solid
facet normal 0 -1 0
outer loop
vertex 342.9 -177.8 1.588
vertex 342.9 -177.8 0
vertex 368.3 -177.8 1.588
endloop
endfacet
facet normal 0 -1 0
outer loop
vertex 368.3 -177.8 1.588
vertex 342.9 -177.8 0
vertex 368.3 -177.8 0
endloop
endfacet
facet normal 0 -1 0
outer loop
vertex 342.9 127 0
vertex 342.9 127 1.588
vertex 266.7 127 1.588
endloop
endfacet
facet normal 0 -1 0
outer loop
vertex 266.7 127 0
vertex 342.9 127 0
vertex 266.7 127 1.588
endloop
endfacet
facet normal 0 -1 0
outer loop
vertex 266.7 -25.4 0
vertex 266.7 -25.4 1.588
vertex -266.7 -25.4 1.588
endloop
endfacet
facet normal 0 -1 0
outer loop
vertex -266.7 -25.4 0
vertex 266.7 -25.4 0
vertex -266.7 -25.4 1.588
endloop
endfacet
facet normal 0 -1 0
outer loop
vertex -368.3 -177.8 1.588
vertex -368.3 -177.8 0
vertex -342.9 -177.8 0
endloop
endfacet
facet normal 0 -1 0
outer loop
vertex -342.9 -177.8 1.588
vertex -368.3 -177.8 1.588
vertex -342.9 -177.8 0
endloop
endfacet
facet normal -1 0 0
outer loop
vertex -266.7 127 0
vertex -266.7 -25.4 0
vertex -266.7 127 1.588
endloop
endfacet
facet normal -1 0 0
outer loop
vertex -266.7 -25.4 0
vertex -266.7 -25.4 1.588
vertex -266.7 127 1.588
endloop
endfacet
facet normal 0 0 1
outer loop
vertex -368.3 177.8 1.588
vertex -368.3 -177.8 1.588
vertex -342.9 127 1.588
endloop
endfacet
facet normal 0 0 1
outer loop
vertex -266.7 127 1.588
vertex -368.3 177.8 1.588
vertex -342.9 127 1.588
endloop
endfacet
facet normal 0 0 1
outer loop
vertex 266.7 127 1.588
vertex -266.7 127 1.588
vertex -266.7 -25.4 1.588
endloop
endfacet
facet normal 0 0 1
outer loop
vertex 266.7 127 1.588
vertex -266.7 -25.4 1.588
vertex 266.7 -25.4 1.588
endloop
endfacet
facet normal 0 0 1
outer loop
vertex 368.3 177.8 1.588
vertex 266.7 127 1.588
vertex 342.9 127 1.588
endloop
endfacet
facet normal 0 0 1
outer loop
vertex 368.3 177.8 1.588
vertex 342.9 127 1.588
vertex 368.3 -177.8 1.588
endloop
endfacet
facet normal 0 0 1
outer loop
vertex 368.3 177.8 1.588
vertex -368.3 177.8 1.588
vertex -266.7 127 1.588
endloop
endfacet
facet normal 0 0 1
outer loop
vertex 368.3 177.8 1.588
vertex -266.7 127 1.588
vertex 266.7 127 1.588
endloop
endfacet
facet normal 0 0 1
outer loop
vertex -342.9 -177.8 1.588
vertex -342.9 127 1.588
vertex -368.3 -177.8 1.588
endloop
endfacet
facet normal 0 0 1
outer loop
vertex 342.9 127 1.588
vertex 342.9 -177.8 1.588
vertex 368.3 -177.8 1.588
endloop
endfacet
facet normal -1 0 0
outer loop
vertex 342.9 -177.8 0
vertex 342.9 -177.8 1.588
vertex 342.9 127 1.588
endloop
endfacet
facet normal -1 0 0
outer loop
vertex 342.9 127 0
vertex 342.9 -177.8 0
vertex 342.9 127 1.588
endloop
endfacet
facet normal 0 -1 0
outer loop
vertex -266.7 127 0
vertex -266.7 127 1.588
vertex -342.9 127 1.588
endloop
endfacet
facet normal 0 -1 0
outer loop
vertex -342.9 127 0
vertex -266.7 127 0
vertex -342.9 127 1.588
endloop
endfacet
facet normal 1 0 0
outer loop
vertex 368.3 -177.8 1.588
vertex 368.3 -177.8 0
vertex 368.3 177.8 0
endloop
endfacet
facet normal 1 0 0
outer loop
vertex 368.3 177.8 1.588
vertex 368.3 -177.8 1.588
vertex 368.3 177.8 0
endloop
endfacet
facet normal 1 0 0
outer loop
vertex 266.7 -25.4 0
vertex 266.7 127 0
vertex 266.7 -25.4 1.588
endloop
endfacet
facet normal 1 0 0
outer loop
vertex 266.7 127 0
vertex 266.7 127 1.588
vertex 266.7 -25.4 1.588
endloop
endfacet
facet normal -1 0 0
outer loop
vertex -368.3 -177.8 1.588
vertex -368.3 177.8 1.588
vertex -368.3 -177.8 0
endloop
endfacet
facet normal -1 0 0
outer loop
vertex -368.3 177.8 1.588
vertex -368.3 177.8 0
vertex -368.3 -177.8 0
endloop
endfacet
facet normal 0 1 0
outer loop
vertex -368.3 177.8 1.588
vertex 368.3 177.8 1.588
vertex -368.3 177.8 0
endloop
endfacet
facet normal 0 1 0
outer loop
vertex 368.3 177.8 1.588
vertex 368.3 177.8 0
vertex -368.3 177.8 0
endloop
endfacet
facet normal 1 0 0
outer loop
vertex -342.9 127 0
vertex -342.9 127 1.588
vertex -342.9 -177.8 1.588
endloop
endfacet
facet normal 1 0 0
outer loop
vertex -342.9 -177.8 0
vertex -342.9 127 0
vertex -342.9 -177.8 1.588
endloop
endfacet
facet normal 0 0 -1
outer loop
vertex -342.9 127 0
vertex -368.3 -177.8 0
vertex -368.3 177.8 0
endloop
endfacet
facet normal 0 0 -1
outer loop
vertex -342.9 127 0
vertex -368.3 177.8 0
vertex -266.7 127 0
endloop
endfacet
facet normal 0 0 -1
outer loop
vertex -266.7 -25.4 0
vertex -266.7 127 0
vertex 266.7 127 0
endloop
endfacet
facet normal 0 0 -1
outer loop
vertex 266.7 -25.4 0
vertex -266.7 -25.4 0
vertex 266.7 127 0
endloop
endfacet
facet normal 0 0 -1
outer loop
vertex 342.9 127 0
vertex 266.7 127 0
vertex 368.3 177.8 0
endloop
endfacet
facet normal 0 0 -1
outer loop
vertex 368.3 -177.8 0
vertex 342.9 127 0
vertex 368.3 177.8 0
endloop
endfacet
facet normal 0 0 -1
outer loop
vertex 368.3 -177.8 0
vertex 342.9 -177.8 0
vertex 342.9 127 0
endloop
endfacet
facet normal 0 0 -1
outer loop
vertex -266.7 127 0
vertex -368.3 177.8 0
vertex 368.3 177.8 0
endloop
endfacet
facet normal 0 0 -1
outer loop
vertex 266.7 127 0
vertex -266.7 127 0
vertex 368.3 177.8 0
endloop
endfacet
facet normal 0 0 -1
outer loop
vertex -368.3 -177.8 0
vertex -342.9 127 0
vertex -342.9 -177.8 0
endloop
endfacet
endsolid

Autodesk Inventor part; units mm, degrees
ref_plane "YZ Plane" through (0, 0, 0) normal (1, 0, 0) x (0, 1, 0)
ref_plane "XZ Plane" through (0, 0, 0) normal (0, 1, 0) x (-1, 0, 0)
ref_plane "XY Plane" through (0, 0, 0) normal (0, 0, 1) x (1, 0, 0)
sketch "Sketch1" plane through (0, 0, 0) normal (0, 0, 1) x (1, 0, 0)
  line L0 (-368.3, -177.8) -> (368.3, -177.8)
  line L1 (368.3, -177.8) -> (368.3, 177.8)
  line L2 (368.3, 177.8) -> (-368.3, 177.8)
  line L3 (-368.3, 177.8) -> (-368.3, -177.8)
  line L4 (-368.3, -177.8) -> (368.3, 177.8) construction
  line L5 (368.3, -177.8) -> (-368.3, 177.8) construction
  point P0 (0, 0)
  dimension "d0" = 355.6
  dimension "d1" = 736.6
extrude "Extrusion1" add sketch "Sketch1" along normal blind 1.5875
sketch "Sketch2" plane through (0, 0, 1.5875) normal (0, 0, 1) x (1, 0, 0)
  line L0 (-368.3, -177.8) -> (368.3, -177.8) projected
  line L1 (368.3, -177.8) -> (368.3, 177.8) projected
  line L2 (368.3, 177.8) -> (-368.3, 177.8) projected
  line L3 (-368.3, 177.8) -> (-368.3, -177.8) projected
  line L4 (-368.3, -177.8) -> (368.3, -177.8) projected
  line L5 (-342.9, -177.8) -> (-266.7, -177.8)
  line L6 (-266.7, -177.8) -> (-266.7, 127)
  line L7 (-266.7, 127) -> (-342.9, 127)
  line L8 (-342.9, 127) -> (-342.9, -177.8)
  point P0 (0, 0)
  dimension "d4" = 50.8
  dimension "d5" = 76.2
  dimension "d6" = 25.4
extrude "Extrusion2" cut sketch "Sketch2" against normal through all contours L8 L7 L6 L0
mirror "Mirror1" about plane through (0, 0, 0) normal (1, 0, 0) of "Extrusion2"
sketch "Sketch3" plane through (0, 0, 1.5875) normal (0, 0, 1) x (1, 0, 0)
  line L0 (342.9, 127) -> (342.9, -177.8) projected
  line L1 (342.9, -177.8) -> (368.3, -177.8) projected
  line L2 (368.3, -177.8) -> (368.3, 177.8) projected
  line L3 (368.3, 177.8) -> (-368.3, 177.8) projected
  line L4 (-368.3, 177.8) -> (-368.3, -177.8) projected
  line L5 (-368.3, -177.8) -> (-342.9, -177.8) projected
  line L6 (-342.9, -177.8) -> (-342.9, 127) projected
  line L7 (-342.9, 127) -> (-266.7, 127) projected
  line L8 (-266.7, 127) -> (-266.7, -177.8) projected
  line L9 (-266.7, -177.8) -> (266.7, -177.8) projected
  line L10 (266.7, -177.8) -> (266.7, 127) projected
  line L11 (266.7, 127) -> (342.9, 127) projected
  line L12 (-266.7, -177.8) -> (266.7, -177.8)
  line L13 (266.7, -177.8) -> (266.7, -25.4)
  line L14 (266.7, -25.4) -> (-266.7, -25.4)
  line L15 (-266.7, -25.4) -> (-266.7, -177.8)
  point P0 (0, 0)
  dimension "d9" = 152.4
extrude "Extrusion3" cut sketch "Sketch3" against normal through all contours L10 L9 L8 L14
properties part number "Human Player Ramp Panel" material "Polycarbonate, Clear"
